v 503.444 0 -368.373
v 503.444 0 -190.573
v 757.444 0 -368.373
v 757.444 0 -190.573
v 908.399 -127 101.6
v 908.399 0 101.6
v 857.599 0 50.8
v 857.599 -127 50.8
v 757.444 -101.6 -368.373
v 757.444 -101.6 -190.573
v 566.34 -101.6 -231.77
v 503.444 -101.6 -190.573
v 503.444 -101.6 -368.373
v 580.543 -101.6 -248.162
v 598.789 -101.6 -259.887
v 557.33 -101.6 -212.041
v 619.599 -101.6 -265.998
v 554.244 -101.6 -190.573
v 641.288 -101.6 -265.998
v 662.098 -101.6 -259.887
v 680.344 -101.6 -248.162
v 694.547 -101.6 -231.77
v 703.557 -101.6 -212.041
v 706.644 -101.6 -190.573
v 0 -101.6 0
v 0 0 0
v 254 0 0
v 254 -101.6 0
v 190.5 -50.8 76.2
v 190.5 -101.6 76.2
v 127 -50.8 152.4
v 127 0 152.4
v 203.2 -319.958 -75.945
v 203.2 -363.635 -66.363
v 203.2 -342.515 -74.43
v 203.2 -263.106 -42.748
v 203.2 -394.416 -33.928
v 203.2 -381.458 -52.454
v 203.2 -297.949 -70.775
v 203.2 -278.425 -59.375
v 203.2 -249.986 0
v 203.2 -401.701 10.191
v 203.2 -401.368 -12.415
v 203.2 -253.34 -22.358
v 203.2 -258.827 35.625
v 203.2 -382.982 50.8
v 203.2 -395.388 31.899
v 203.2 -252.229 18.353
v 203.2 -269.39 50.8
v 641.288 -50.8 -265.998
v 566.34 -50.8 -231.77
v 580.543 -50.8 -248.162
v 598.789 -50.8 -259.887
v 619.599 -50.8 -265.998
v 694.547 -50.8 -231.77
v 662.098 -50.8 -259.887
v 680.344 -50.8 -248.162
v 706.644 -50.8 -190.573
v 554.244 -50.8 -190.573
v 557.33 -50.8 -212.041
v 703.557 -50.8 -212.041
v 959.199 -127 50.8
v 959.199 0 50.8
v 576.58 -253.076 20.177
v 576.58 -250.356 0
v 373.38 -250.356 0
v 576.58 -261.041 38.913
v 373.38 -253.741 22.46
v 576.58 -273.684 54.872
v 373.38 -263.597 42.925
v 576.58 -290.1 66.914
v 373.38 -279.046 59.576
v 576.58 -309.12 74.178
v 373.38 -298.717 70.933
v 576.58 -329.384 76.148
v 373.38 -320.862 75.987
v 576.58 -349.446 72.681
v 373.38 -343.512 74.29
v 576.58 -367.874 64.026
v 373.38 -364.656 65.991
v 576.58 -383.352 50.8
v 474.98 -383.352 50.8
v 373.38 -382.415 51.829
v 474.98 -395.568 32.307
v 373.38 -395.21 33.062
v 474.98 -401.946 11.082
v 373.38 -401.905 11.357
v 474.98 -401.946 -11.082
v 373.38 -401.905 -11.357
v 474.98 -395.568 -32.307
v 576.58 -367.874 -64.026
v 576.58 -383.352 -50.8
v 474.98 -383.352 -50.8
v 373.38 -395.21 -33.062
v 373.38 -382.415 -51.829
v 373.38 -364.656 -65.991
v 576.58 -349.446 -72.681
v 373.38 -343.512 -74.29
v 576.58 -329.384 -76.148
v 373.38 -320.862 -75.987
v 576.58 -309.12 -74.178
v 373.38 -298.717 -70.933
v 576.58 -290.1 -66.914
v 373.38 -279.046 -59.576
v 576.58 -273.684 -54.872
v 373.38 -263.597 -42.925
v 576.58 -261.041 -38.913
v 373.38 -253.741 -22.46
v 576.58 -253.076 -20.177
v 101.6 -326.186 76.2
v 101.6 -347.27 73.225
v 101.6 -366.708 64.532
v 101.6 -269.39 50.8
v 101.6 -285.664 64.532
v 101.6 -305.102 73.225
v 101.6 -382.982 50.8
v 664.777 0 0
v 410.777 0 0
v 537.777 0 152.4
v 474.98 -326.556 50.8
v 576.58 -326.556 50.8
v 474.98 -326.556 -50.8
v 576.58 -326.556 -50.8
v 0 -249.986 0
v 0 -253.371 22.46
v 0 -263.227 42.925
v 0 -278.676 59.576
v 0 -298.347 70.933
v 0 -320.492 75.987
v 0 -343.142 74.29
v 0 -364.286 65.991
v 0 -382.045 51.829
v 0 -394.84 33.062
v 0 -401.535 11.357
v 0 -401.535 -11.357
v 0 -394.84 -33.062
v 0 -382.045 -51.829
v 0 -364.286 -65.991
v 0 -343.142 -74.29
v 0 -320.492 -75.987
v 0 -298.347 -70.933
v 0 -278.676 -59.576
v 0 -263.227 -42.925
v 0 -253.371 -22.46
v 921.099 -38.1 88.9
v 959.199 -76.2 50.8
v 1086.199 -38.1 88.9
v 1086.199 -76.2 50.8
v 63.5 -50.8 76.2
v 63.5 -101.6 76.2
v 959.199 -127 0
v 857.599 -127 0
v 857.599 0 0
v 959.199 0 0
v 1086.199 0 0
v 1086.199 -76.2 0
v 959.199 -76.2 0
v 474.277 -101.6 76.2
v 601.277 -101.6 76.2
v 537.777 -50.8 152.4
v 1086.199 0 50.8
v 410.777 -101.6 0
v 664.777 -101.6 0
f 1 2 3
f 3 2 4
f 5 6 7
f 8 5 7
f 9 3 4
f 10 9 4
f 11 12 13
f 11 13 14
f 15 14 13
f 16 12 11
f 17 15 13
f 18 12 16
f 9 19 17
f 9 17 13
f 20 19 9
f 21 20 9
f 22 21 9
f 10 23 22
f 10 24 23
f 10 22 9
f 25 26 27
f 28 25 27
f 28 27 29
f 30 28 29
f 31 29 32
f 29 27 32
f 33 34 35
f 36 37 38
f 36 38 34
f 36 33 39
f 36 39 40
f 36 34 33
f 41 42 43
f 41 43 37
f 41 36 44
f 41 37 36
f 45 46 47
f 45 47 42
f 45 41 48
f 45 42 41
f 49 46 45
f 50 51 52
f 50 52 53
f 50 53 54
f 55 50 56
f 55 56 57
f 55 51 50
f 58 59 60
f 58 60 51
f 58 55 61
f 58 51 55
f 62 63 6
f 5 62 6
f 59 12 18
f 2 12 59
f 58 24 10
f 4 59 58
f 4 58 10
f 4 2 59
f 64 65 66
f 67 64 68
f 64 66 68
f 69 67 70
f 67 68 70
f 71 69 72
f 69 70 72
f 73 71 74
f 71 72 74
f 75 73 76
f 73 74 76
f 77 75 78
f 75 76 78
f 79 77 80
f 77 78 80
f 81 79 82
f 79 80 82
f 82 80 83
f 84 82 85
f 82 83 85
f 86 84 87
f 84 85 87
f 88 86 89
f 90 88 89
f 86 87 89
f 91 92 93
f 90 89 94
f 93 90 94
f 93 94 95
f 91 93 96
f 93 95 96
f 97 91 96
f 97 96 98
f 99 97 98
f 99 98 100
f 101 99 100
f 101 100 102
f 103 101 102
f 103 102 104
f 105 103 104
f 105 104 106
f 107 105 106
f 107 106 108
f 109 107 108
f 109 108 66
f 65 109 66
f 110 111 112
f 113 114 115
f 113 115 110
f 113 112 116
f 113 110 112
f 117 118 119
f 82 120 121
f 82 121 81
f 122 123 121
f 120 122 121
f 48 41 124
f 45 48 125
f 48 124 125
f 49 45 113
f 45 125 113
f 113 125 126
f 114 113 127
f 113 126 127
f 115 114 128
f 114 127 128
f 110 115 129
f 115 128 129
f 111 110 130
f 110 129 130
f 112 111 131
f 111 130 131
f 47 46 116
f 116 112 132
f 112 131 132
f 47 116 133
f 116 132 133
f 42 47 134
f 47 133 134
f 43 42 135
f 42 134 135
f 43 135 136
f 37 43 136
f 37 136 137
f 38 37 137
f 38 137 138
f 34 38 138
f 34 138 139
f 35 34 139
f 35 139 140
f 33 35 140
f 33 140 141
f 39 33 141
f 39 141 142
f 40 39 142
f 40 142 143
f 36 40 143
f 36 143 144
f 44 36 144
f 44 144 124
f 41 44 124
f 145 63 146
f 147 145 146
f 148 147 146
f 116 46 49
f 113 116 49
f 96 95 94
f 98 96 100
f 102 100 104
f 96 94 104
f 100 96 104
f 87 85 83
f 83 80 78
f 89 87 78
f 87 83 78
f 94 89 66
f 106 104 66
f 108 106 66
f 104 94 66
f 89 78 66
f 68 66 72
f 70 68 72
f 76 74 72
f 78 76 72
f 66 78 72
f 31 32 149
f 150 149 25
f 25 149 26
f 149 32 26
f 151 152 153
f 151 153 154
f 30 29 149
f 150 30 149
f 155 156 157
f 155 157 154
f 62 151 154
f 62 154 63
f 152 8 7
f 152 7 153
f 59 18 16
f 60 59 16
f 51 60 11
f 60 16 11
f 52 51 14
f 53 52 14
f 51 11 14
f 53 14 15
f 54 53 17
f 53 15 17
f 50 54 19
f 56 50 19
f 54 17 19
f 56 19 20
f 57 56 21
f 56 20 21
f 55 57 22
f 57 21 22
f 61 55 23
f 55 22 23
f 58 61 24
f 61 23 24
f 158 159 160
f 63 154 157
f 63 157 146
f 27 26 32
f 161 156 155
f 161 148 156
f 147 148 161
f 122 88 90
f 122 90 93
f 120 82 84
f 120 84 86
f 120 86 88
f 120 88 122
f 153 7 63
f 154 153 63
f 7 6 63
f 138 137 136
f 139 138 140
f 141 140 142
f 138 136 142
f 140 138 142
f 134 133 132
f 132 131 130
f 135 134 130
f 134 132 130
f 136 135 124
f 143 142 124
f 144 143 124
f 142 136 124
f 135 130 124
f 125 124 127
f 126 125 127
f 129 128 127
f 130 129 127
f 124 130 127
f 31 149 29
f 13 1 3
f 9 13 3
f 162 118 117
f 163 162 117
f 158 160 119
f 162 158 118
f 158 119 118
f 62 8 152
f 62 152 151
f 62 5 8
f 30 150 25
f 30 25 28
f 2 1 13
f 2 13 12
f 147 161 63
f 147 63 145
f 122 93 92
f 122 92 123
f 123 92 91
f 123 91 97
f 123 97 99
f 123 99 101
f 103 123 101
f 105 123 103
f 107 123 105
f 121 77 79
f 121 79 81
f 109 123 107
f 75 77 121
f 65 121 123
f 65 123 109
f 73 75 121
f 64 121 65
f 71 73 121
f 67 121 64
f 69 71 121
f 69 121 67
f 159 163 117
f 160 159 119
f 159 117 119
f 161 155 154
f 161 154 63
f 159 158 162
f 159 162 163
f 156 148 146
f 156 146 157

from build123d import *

# Parameters (mm, degrees)
F1_DEPTH  = 101.6
F2_DEPTH  = 50.8
F4_DEPTH  = 101.6
F5_DEPTH  = 101.6
F9_DEPTH  = 63.5
F11_DEPTH = 127
F15_R     = 76.2
F16_DEPTH = 203.2
F18_DEPTH = 101.6
F20_R     = 76.2
F21_DEPTH = 203.2
F23_DEPTH = 101.6
F24_W     = 254
F24_H     = 177.8
F25_DEPTH = 101.6
F27_DEPTH = 50.8


with BuildPart() as f1:
    # F0 (on Front) → F1 (new body)
    with BuildSketch(Plane.XZ):
        Polygon((127, 0), (254, 0), (190.5, 76.2), (63.5, 76.2), (0, 0), align=None)
    extrude(amount=F1_DEPTH)

    # F0 (on Front) → F2 (join)
    with BuildSketch(Plane.XZ):
        Polygon((127, 0), (254, 0), (190.5, 76.2), (63.5, 76.2), (0, 0), align=None)
        Polygon((63.5, 76.2), (190.5, 76.2), (127, 152.4), align=None)
    extrude(amount=F2_DEPTH)


with BuildPart() as f4:
    # F3 (on Front) → F4 (new body)
    with BuildSketch(Plane.XZ):
        Polygon((474.2767357125, 76.2), (601.2767357125, 76.2), (537.7767357125, 152.4), align=None)
    extrude(amount=F4_DEPTH)

    # F3 (on Front) → F5 (join)
    with BuildSketch(Plane.XZ):
        Polygon((410.7767357125, 0), (664.7767357125, 0), (601.2767357125, 76.2), (474.2767357125, 76.2), align=None)
        Polygon((474.2767357125, 76.2), (601.2767357125, 76.2), (537.7767357125, 152.4), align=None)
    extrude(amount=F5_DEPTH)

    # F8 (on 3pt) → F9 (cut, symmetric)
    with BuildSketch(Plane.YZ.offset(537.7767357125)):
        Polygon((-50.8, 152.4), (-101.6, 152.4), (-101.6, 76.2), align=None)
    extrude(amount=F9_DEPTH, both=True, mode=Mode.SUBTRACT)


with BuildPart() as f11:
    # F10 (on Front) → F11 (new body)
    with BuildSketch(Plane.XZ):
        Polygon((857.5985686302, 50.8), (857.5985686302, 0), (959.1985686302, 0), (959.1985686302, 50.8), (908.3985686302, 101.6), align=None)
    extrude(amount=F11_DEPTH)


with BuildPart() as f14:
    # F13 (on offset) → F14 (new body, up to the next surface of F11)
    with BuildSketch(Plane.YZ.offset(1086.1985686302)):
        Polygon((-76.2, 0), (0, 0), (0, 50.8), (-38.1, 88.9), (-76.2, 50.8), align=None)
    extrude(until=Until.NEXT, target=f11.part, dir=(-1, 0, 0))


with BuildPart() as f16:
    # F15 (on Right) → F16 (new body)
    with BuildSketch(Plane.YZ):
        with Locations((-326.1859508244, 0)):
            Circle(F15_R)
    extrude(amount=F16_DEPTH)

    # F17 (on face) → F18 (cut)
    with BuildSketch(Plane.YZ.offset(203.2)):
        with BuildLine():
            Line((-382.9820774529, 50.8), (-326.1859508244, 50.8))
            Line((-326.1859508244, 50.8), (-269.3898241959, 50.8))
            ThreePointArc((-269.3898241959, 50.8), (-326.1859508244, 76.2), (-382.9820774529, 50.8))
        make_face()
    extrude(amount=-F18_DEPTH, mode=Mode.SUBTRACT)


with BuildPart() as f21:
    # F20 (on offset) → F21 (new body)
    with BuildSketch(Plane.YZ.offset(373.38)):
        with Locations((-326.5561448047, 0)):
            Circle(F20_R)
    extrude(amount=F21_DEPTH)

    # F22 (on face) → F23 (cut)
    with BuildSketch(Plane.YZ.offset(576.58)):
        with BuildLine():
            Line((-326.5561448047, -50.8), (-326.5561448047, 0))
            Line((-326.5561448047, 0), (-326.5561448047, 50.8))
            Line((-326.5561448047, 50.8), (-383.3522714332, 50.8))
            ThreePointArc((-383.3522714332, 50.8), (-402.7561448047, 0), (-383.3522714332, -50.8))
            Line((-383.3522714332, -50.8), (-326.5561448047, -50.8))
        make_face()
    extrude(amount=-F23_DEPTH, mode=Mode.SUBTRACT)


with BuildPart() as f25:
    # F24 (on Front) → F25 (new body)
    with BuildSketch(Plane.XZ):
        with Locations((630.4435391426, -279.4734539032)):
            Rectangle(F24_W, F24_H)
    extrude(amount=F25_DEPTH)

    # F26 (on face) → F27 (cut)
    with BuildSketch(Plane.XZ.offset(101.6)):
        with BuildLine():
            Line((706.6435391426, -190.5734539032), (554.2435391426, -190.5734539032))
            ThreePointArc((554.2435391426, -190.5734539032), (630.4435391426, -266.7734539032), (706.6435391426, -190.5734539032))
        make_face()
    extrude(amount=-F27_DEPTH, mode=Mode.SUBTRACT)


solid = Compound([f1.part, f4.part, f11.part, f14.part, f16.part, f21.part, f25.part])
